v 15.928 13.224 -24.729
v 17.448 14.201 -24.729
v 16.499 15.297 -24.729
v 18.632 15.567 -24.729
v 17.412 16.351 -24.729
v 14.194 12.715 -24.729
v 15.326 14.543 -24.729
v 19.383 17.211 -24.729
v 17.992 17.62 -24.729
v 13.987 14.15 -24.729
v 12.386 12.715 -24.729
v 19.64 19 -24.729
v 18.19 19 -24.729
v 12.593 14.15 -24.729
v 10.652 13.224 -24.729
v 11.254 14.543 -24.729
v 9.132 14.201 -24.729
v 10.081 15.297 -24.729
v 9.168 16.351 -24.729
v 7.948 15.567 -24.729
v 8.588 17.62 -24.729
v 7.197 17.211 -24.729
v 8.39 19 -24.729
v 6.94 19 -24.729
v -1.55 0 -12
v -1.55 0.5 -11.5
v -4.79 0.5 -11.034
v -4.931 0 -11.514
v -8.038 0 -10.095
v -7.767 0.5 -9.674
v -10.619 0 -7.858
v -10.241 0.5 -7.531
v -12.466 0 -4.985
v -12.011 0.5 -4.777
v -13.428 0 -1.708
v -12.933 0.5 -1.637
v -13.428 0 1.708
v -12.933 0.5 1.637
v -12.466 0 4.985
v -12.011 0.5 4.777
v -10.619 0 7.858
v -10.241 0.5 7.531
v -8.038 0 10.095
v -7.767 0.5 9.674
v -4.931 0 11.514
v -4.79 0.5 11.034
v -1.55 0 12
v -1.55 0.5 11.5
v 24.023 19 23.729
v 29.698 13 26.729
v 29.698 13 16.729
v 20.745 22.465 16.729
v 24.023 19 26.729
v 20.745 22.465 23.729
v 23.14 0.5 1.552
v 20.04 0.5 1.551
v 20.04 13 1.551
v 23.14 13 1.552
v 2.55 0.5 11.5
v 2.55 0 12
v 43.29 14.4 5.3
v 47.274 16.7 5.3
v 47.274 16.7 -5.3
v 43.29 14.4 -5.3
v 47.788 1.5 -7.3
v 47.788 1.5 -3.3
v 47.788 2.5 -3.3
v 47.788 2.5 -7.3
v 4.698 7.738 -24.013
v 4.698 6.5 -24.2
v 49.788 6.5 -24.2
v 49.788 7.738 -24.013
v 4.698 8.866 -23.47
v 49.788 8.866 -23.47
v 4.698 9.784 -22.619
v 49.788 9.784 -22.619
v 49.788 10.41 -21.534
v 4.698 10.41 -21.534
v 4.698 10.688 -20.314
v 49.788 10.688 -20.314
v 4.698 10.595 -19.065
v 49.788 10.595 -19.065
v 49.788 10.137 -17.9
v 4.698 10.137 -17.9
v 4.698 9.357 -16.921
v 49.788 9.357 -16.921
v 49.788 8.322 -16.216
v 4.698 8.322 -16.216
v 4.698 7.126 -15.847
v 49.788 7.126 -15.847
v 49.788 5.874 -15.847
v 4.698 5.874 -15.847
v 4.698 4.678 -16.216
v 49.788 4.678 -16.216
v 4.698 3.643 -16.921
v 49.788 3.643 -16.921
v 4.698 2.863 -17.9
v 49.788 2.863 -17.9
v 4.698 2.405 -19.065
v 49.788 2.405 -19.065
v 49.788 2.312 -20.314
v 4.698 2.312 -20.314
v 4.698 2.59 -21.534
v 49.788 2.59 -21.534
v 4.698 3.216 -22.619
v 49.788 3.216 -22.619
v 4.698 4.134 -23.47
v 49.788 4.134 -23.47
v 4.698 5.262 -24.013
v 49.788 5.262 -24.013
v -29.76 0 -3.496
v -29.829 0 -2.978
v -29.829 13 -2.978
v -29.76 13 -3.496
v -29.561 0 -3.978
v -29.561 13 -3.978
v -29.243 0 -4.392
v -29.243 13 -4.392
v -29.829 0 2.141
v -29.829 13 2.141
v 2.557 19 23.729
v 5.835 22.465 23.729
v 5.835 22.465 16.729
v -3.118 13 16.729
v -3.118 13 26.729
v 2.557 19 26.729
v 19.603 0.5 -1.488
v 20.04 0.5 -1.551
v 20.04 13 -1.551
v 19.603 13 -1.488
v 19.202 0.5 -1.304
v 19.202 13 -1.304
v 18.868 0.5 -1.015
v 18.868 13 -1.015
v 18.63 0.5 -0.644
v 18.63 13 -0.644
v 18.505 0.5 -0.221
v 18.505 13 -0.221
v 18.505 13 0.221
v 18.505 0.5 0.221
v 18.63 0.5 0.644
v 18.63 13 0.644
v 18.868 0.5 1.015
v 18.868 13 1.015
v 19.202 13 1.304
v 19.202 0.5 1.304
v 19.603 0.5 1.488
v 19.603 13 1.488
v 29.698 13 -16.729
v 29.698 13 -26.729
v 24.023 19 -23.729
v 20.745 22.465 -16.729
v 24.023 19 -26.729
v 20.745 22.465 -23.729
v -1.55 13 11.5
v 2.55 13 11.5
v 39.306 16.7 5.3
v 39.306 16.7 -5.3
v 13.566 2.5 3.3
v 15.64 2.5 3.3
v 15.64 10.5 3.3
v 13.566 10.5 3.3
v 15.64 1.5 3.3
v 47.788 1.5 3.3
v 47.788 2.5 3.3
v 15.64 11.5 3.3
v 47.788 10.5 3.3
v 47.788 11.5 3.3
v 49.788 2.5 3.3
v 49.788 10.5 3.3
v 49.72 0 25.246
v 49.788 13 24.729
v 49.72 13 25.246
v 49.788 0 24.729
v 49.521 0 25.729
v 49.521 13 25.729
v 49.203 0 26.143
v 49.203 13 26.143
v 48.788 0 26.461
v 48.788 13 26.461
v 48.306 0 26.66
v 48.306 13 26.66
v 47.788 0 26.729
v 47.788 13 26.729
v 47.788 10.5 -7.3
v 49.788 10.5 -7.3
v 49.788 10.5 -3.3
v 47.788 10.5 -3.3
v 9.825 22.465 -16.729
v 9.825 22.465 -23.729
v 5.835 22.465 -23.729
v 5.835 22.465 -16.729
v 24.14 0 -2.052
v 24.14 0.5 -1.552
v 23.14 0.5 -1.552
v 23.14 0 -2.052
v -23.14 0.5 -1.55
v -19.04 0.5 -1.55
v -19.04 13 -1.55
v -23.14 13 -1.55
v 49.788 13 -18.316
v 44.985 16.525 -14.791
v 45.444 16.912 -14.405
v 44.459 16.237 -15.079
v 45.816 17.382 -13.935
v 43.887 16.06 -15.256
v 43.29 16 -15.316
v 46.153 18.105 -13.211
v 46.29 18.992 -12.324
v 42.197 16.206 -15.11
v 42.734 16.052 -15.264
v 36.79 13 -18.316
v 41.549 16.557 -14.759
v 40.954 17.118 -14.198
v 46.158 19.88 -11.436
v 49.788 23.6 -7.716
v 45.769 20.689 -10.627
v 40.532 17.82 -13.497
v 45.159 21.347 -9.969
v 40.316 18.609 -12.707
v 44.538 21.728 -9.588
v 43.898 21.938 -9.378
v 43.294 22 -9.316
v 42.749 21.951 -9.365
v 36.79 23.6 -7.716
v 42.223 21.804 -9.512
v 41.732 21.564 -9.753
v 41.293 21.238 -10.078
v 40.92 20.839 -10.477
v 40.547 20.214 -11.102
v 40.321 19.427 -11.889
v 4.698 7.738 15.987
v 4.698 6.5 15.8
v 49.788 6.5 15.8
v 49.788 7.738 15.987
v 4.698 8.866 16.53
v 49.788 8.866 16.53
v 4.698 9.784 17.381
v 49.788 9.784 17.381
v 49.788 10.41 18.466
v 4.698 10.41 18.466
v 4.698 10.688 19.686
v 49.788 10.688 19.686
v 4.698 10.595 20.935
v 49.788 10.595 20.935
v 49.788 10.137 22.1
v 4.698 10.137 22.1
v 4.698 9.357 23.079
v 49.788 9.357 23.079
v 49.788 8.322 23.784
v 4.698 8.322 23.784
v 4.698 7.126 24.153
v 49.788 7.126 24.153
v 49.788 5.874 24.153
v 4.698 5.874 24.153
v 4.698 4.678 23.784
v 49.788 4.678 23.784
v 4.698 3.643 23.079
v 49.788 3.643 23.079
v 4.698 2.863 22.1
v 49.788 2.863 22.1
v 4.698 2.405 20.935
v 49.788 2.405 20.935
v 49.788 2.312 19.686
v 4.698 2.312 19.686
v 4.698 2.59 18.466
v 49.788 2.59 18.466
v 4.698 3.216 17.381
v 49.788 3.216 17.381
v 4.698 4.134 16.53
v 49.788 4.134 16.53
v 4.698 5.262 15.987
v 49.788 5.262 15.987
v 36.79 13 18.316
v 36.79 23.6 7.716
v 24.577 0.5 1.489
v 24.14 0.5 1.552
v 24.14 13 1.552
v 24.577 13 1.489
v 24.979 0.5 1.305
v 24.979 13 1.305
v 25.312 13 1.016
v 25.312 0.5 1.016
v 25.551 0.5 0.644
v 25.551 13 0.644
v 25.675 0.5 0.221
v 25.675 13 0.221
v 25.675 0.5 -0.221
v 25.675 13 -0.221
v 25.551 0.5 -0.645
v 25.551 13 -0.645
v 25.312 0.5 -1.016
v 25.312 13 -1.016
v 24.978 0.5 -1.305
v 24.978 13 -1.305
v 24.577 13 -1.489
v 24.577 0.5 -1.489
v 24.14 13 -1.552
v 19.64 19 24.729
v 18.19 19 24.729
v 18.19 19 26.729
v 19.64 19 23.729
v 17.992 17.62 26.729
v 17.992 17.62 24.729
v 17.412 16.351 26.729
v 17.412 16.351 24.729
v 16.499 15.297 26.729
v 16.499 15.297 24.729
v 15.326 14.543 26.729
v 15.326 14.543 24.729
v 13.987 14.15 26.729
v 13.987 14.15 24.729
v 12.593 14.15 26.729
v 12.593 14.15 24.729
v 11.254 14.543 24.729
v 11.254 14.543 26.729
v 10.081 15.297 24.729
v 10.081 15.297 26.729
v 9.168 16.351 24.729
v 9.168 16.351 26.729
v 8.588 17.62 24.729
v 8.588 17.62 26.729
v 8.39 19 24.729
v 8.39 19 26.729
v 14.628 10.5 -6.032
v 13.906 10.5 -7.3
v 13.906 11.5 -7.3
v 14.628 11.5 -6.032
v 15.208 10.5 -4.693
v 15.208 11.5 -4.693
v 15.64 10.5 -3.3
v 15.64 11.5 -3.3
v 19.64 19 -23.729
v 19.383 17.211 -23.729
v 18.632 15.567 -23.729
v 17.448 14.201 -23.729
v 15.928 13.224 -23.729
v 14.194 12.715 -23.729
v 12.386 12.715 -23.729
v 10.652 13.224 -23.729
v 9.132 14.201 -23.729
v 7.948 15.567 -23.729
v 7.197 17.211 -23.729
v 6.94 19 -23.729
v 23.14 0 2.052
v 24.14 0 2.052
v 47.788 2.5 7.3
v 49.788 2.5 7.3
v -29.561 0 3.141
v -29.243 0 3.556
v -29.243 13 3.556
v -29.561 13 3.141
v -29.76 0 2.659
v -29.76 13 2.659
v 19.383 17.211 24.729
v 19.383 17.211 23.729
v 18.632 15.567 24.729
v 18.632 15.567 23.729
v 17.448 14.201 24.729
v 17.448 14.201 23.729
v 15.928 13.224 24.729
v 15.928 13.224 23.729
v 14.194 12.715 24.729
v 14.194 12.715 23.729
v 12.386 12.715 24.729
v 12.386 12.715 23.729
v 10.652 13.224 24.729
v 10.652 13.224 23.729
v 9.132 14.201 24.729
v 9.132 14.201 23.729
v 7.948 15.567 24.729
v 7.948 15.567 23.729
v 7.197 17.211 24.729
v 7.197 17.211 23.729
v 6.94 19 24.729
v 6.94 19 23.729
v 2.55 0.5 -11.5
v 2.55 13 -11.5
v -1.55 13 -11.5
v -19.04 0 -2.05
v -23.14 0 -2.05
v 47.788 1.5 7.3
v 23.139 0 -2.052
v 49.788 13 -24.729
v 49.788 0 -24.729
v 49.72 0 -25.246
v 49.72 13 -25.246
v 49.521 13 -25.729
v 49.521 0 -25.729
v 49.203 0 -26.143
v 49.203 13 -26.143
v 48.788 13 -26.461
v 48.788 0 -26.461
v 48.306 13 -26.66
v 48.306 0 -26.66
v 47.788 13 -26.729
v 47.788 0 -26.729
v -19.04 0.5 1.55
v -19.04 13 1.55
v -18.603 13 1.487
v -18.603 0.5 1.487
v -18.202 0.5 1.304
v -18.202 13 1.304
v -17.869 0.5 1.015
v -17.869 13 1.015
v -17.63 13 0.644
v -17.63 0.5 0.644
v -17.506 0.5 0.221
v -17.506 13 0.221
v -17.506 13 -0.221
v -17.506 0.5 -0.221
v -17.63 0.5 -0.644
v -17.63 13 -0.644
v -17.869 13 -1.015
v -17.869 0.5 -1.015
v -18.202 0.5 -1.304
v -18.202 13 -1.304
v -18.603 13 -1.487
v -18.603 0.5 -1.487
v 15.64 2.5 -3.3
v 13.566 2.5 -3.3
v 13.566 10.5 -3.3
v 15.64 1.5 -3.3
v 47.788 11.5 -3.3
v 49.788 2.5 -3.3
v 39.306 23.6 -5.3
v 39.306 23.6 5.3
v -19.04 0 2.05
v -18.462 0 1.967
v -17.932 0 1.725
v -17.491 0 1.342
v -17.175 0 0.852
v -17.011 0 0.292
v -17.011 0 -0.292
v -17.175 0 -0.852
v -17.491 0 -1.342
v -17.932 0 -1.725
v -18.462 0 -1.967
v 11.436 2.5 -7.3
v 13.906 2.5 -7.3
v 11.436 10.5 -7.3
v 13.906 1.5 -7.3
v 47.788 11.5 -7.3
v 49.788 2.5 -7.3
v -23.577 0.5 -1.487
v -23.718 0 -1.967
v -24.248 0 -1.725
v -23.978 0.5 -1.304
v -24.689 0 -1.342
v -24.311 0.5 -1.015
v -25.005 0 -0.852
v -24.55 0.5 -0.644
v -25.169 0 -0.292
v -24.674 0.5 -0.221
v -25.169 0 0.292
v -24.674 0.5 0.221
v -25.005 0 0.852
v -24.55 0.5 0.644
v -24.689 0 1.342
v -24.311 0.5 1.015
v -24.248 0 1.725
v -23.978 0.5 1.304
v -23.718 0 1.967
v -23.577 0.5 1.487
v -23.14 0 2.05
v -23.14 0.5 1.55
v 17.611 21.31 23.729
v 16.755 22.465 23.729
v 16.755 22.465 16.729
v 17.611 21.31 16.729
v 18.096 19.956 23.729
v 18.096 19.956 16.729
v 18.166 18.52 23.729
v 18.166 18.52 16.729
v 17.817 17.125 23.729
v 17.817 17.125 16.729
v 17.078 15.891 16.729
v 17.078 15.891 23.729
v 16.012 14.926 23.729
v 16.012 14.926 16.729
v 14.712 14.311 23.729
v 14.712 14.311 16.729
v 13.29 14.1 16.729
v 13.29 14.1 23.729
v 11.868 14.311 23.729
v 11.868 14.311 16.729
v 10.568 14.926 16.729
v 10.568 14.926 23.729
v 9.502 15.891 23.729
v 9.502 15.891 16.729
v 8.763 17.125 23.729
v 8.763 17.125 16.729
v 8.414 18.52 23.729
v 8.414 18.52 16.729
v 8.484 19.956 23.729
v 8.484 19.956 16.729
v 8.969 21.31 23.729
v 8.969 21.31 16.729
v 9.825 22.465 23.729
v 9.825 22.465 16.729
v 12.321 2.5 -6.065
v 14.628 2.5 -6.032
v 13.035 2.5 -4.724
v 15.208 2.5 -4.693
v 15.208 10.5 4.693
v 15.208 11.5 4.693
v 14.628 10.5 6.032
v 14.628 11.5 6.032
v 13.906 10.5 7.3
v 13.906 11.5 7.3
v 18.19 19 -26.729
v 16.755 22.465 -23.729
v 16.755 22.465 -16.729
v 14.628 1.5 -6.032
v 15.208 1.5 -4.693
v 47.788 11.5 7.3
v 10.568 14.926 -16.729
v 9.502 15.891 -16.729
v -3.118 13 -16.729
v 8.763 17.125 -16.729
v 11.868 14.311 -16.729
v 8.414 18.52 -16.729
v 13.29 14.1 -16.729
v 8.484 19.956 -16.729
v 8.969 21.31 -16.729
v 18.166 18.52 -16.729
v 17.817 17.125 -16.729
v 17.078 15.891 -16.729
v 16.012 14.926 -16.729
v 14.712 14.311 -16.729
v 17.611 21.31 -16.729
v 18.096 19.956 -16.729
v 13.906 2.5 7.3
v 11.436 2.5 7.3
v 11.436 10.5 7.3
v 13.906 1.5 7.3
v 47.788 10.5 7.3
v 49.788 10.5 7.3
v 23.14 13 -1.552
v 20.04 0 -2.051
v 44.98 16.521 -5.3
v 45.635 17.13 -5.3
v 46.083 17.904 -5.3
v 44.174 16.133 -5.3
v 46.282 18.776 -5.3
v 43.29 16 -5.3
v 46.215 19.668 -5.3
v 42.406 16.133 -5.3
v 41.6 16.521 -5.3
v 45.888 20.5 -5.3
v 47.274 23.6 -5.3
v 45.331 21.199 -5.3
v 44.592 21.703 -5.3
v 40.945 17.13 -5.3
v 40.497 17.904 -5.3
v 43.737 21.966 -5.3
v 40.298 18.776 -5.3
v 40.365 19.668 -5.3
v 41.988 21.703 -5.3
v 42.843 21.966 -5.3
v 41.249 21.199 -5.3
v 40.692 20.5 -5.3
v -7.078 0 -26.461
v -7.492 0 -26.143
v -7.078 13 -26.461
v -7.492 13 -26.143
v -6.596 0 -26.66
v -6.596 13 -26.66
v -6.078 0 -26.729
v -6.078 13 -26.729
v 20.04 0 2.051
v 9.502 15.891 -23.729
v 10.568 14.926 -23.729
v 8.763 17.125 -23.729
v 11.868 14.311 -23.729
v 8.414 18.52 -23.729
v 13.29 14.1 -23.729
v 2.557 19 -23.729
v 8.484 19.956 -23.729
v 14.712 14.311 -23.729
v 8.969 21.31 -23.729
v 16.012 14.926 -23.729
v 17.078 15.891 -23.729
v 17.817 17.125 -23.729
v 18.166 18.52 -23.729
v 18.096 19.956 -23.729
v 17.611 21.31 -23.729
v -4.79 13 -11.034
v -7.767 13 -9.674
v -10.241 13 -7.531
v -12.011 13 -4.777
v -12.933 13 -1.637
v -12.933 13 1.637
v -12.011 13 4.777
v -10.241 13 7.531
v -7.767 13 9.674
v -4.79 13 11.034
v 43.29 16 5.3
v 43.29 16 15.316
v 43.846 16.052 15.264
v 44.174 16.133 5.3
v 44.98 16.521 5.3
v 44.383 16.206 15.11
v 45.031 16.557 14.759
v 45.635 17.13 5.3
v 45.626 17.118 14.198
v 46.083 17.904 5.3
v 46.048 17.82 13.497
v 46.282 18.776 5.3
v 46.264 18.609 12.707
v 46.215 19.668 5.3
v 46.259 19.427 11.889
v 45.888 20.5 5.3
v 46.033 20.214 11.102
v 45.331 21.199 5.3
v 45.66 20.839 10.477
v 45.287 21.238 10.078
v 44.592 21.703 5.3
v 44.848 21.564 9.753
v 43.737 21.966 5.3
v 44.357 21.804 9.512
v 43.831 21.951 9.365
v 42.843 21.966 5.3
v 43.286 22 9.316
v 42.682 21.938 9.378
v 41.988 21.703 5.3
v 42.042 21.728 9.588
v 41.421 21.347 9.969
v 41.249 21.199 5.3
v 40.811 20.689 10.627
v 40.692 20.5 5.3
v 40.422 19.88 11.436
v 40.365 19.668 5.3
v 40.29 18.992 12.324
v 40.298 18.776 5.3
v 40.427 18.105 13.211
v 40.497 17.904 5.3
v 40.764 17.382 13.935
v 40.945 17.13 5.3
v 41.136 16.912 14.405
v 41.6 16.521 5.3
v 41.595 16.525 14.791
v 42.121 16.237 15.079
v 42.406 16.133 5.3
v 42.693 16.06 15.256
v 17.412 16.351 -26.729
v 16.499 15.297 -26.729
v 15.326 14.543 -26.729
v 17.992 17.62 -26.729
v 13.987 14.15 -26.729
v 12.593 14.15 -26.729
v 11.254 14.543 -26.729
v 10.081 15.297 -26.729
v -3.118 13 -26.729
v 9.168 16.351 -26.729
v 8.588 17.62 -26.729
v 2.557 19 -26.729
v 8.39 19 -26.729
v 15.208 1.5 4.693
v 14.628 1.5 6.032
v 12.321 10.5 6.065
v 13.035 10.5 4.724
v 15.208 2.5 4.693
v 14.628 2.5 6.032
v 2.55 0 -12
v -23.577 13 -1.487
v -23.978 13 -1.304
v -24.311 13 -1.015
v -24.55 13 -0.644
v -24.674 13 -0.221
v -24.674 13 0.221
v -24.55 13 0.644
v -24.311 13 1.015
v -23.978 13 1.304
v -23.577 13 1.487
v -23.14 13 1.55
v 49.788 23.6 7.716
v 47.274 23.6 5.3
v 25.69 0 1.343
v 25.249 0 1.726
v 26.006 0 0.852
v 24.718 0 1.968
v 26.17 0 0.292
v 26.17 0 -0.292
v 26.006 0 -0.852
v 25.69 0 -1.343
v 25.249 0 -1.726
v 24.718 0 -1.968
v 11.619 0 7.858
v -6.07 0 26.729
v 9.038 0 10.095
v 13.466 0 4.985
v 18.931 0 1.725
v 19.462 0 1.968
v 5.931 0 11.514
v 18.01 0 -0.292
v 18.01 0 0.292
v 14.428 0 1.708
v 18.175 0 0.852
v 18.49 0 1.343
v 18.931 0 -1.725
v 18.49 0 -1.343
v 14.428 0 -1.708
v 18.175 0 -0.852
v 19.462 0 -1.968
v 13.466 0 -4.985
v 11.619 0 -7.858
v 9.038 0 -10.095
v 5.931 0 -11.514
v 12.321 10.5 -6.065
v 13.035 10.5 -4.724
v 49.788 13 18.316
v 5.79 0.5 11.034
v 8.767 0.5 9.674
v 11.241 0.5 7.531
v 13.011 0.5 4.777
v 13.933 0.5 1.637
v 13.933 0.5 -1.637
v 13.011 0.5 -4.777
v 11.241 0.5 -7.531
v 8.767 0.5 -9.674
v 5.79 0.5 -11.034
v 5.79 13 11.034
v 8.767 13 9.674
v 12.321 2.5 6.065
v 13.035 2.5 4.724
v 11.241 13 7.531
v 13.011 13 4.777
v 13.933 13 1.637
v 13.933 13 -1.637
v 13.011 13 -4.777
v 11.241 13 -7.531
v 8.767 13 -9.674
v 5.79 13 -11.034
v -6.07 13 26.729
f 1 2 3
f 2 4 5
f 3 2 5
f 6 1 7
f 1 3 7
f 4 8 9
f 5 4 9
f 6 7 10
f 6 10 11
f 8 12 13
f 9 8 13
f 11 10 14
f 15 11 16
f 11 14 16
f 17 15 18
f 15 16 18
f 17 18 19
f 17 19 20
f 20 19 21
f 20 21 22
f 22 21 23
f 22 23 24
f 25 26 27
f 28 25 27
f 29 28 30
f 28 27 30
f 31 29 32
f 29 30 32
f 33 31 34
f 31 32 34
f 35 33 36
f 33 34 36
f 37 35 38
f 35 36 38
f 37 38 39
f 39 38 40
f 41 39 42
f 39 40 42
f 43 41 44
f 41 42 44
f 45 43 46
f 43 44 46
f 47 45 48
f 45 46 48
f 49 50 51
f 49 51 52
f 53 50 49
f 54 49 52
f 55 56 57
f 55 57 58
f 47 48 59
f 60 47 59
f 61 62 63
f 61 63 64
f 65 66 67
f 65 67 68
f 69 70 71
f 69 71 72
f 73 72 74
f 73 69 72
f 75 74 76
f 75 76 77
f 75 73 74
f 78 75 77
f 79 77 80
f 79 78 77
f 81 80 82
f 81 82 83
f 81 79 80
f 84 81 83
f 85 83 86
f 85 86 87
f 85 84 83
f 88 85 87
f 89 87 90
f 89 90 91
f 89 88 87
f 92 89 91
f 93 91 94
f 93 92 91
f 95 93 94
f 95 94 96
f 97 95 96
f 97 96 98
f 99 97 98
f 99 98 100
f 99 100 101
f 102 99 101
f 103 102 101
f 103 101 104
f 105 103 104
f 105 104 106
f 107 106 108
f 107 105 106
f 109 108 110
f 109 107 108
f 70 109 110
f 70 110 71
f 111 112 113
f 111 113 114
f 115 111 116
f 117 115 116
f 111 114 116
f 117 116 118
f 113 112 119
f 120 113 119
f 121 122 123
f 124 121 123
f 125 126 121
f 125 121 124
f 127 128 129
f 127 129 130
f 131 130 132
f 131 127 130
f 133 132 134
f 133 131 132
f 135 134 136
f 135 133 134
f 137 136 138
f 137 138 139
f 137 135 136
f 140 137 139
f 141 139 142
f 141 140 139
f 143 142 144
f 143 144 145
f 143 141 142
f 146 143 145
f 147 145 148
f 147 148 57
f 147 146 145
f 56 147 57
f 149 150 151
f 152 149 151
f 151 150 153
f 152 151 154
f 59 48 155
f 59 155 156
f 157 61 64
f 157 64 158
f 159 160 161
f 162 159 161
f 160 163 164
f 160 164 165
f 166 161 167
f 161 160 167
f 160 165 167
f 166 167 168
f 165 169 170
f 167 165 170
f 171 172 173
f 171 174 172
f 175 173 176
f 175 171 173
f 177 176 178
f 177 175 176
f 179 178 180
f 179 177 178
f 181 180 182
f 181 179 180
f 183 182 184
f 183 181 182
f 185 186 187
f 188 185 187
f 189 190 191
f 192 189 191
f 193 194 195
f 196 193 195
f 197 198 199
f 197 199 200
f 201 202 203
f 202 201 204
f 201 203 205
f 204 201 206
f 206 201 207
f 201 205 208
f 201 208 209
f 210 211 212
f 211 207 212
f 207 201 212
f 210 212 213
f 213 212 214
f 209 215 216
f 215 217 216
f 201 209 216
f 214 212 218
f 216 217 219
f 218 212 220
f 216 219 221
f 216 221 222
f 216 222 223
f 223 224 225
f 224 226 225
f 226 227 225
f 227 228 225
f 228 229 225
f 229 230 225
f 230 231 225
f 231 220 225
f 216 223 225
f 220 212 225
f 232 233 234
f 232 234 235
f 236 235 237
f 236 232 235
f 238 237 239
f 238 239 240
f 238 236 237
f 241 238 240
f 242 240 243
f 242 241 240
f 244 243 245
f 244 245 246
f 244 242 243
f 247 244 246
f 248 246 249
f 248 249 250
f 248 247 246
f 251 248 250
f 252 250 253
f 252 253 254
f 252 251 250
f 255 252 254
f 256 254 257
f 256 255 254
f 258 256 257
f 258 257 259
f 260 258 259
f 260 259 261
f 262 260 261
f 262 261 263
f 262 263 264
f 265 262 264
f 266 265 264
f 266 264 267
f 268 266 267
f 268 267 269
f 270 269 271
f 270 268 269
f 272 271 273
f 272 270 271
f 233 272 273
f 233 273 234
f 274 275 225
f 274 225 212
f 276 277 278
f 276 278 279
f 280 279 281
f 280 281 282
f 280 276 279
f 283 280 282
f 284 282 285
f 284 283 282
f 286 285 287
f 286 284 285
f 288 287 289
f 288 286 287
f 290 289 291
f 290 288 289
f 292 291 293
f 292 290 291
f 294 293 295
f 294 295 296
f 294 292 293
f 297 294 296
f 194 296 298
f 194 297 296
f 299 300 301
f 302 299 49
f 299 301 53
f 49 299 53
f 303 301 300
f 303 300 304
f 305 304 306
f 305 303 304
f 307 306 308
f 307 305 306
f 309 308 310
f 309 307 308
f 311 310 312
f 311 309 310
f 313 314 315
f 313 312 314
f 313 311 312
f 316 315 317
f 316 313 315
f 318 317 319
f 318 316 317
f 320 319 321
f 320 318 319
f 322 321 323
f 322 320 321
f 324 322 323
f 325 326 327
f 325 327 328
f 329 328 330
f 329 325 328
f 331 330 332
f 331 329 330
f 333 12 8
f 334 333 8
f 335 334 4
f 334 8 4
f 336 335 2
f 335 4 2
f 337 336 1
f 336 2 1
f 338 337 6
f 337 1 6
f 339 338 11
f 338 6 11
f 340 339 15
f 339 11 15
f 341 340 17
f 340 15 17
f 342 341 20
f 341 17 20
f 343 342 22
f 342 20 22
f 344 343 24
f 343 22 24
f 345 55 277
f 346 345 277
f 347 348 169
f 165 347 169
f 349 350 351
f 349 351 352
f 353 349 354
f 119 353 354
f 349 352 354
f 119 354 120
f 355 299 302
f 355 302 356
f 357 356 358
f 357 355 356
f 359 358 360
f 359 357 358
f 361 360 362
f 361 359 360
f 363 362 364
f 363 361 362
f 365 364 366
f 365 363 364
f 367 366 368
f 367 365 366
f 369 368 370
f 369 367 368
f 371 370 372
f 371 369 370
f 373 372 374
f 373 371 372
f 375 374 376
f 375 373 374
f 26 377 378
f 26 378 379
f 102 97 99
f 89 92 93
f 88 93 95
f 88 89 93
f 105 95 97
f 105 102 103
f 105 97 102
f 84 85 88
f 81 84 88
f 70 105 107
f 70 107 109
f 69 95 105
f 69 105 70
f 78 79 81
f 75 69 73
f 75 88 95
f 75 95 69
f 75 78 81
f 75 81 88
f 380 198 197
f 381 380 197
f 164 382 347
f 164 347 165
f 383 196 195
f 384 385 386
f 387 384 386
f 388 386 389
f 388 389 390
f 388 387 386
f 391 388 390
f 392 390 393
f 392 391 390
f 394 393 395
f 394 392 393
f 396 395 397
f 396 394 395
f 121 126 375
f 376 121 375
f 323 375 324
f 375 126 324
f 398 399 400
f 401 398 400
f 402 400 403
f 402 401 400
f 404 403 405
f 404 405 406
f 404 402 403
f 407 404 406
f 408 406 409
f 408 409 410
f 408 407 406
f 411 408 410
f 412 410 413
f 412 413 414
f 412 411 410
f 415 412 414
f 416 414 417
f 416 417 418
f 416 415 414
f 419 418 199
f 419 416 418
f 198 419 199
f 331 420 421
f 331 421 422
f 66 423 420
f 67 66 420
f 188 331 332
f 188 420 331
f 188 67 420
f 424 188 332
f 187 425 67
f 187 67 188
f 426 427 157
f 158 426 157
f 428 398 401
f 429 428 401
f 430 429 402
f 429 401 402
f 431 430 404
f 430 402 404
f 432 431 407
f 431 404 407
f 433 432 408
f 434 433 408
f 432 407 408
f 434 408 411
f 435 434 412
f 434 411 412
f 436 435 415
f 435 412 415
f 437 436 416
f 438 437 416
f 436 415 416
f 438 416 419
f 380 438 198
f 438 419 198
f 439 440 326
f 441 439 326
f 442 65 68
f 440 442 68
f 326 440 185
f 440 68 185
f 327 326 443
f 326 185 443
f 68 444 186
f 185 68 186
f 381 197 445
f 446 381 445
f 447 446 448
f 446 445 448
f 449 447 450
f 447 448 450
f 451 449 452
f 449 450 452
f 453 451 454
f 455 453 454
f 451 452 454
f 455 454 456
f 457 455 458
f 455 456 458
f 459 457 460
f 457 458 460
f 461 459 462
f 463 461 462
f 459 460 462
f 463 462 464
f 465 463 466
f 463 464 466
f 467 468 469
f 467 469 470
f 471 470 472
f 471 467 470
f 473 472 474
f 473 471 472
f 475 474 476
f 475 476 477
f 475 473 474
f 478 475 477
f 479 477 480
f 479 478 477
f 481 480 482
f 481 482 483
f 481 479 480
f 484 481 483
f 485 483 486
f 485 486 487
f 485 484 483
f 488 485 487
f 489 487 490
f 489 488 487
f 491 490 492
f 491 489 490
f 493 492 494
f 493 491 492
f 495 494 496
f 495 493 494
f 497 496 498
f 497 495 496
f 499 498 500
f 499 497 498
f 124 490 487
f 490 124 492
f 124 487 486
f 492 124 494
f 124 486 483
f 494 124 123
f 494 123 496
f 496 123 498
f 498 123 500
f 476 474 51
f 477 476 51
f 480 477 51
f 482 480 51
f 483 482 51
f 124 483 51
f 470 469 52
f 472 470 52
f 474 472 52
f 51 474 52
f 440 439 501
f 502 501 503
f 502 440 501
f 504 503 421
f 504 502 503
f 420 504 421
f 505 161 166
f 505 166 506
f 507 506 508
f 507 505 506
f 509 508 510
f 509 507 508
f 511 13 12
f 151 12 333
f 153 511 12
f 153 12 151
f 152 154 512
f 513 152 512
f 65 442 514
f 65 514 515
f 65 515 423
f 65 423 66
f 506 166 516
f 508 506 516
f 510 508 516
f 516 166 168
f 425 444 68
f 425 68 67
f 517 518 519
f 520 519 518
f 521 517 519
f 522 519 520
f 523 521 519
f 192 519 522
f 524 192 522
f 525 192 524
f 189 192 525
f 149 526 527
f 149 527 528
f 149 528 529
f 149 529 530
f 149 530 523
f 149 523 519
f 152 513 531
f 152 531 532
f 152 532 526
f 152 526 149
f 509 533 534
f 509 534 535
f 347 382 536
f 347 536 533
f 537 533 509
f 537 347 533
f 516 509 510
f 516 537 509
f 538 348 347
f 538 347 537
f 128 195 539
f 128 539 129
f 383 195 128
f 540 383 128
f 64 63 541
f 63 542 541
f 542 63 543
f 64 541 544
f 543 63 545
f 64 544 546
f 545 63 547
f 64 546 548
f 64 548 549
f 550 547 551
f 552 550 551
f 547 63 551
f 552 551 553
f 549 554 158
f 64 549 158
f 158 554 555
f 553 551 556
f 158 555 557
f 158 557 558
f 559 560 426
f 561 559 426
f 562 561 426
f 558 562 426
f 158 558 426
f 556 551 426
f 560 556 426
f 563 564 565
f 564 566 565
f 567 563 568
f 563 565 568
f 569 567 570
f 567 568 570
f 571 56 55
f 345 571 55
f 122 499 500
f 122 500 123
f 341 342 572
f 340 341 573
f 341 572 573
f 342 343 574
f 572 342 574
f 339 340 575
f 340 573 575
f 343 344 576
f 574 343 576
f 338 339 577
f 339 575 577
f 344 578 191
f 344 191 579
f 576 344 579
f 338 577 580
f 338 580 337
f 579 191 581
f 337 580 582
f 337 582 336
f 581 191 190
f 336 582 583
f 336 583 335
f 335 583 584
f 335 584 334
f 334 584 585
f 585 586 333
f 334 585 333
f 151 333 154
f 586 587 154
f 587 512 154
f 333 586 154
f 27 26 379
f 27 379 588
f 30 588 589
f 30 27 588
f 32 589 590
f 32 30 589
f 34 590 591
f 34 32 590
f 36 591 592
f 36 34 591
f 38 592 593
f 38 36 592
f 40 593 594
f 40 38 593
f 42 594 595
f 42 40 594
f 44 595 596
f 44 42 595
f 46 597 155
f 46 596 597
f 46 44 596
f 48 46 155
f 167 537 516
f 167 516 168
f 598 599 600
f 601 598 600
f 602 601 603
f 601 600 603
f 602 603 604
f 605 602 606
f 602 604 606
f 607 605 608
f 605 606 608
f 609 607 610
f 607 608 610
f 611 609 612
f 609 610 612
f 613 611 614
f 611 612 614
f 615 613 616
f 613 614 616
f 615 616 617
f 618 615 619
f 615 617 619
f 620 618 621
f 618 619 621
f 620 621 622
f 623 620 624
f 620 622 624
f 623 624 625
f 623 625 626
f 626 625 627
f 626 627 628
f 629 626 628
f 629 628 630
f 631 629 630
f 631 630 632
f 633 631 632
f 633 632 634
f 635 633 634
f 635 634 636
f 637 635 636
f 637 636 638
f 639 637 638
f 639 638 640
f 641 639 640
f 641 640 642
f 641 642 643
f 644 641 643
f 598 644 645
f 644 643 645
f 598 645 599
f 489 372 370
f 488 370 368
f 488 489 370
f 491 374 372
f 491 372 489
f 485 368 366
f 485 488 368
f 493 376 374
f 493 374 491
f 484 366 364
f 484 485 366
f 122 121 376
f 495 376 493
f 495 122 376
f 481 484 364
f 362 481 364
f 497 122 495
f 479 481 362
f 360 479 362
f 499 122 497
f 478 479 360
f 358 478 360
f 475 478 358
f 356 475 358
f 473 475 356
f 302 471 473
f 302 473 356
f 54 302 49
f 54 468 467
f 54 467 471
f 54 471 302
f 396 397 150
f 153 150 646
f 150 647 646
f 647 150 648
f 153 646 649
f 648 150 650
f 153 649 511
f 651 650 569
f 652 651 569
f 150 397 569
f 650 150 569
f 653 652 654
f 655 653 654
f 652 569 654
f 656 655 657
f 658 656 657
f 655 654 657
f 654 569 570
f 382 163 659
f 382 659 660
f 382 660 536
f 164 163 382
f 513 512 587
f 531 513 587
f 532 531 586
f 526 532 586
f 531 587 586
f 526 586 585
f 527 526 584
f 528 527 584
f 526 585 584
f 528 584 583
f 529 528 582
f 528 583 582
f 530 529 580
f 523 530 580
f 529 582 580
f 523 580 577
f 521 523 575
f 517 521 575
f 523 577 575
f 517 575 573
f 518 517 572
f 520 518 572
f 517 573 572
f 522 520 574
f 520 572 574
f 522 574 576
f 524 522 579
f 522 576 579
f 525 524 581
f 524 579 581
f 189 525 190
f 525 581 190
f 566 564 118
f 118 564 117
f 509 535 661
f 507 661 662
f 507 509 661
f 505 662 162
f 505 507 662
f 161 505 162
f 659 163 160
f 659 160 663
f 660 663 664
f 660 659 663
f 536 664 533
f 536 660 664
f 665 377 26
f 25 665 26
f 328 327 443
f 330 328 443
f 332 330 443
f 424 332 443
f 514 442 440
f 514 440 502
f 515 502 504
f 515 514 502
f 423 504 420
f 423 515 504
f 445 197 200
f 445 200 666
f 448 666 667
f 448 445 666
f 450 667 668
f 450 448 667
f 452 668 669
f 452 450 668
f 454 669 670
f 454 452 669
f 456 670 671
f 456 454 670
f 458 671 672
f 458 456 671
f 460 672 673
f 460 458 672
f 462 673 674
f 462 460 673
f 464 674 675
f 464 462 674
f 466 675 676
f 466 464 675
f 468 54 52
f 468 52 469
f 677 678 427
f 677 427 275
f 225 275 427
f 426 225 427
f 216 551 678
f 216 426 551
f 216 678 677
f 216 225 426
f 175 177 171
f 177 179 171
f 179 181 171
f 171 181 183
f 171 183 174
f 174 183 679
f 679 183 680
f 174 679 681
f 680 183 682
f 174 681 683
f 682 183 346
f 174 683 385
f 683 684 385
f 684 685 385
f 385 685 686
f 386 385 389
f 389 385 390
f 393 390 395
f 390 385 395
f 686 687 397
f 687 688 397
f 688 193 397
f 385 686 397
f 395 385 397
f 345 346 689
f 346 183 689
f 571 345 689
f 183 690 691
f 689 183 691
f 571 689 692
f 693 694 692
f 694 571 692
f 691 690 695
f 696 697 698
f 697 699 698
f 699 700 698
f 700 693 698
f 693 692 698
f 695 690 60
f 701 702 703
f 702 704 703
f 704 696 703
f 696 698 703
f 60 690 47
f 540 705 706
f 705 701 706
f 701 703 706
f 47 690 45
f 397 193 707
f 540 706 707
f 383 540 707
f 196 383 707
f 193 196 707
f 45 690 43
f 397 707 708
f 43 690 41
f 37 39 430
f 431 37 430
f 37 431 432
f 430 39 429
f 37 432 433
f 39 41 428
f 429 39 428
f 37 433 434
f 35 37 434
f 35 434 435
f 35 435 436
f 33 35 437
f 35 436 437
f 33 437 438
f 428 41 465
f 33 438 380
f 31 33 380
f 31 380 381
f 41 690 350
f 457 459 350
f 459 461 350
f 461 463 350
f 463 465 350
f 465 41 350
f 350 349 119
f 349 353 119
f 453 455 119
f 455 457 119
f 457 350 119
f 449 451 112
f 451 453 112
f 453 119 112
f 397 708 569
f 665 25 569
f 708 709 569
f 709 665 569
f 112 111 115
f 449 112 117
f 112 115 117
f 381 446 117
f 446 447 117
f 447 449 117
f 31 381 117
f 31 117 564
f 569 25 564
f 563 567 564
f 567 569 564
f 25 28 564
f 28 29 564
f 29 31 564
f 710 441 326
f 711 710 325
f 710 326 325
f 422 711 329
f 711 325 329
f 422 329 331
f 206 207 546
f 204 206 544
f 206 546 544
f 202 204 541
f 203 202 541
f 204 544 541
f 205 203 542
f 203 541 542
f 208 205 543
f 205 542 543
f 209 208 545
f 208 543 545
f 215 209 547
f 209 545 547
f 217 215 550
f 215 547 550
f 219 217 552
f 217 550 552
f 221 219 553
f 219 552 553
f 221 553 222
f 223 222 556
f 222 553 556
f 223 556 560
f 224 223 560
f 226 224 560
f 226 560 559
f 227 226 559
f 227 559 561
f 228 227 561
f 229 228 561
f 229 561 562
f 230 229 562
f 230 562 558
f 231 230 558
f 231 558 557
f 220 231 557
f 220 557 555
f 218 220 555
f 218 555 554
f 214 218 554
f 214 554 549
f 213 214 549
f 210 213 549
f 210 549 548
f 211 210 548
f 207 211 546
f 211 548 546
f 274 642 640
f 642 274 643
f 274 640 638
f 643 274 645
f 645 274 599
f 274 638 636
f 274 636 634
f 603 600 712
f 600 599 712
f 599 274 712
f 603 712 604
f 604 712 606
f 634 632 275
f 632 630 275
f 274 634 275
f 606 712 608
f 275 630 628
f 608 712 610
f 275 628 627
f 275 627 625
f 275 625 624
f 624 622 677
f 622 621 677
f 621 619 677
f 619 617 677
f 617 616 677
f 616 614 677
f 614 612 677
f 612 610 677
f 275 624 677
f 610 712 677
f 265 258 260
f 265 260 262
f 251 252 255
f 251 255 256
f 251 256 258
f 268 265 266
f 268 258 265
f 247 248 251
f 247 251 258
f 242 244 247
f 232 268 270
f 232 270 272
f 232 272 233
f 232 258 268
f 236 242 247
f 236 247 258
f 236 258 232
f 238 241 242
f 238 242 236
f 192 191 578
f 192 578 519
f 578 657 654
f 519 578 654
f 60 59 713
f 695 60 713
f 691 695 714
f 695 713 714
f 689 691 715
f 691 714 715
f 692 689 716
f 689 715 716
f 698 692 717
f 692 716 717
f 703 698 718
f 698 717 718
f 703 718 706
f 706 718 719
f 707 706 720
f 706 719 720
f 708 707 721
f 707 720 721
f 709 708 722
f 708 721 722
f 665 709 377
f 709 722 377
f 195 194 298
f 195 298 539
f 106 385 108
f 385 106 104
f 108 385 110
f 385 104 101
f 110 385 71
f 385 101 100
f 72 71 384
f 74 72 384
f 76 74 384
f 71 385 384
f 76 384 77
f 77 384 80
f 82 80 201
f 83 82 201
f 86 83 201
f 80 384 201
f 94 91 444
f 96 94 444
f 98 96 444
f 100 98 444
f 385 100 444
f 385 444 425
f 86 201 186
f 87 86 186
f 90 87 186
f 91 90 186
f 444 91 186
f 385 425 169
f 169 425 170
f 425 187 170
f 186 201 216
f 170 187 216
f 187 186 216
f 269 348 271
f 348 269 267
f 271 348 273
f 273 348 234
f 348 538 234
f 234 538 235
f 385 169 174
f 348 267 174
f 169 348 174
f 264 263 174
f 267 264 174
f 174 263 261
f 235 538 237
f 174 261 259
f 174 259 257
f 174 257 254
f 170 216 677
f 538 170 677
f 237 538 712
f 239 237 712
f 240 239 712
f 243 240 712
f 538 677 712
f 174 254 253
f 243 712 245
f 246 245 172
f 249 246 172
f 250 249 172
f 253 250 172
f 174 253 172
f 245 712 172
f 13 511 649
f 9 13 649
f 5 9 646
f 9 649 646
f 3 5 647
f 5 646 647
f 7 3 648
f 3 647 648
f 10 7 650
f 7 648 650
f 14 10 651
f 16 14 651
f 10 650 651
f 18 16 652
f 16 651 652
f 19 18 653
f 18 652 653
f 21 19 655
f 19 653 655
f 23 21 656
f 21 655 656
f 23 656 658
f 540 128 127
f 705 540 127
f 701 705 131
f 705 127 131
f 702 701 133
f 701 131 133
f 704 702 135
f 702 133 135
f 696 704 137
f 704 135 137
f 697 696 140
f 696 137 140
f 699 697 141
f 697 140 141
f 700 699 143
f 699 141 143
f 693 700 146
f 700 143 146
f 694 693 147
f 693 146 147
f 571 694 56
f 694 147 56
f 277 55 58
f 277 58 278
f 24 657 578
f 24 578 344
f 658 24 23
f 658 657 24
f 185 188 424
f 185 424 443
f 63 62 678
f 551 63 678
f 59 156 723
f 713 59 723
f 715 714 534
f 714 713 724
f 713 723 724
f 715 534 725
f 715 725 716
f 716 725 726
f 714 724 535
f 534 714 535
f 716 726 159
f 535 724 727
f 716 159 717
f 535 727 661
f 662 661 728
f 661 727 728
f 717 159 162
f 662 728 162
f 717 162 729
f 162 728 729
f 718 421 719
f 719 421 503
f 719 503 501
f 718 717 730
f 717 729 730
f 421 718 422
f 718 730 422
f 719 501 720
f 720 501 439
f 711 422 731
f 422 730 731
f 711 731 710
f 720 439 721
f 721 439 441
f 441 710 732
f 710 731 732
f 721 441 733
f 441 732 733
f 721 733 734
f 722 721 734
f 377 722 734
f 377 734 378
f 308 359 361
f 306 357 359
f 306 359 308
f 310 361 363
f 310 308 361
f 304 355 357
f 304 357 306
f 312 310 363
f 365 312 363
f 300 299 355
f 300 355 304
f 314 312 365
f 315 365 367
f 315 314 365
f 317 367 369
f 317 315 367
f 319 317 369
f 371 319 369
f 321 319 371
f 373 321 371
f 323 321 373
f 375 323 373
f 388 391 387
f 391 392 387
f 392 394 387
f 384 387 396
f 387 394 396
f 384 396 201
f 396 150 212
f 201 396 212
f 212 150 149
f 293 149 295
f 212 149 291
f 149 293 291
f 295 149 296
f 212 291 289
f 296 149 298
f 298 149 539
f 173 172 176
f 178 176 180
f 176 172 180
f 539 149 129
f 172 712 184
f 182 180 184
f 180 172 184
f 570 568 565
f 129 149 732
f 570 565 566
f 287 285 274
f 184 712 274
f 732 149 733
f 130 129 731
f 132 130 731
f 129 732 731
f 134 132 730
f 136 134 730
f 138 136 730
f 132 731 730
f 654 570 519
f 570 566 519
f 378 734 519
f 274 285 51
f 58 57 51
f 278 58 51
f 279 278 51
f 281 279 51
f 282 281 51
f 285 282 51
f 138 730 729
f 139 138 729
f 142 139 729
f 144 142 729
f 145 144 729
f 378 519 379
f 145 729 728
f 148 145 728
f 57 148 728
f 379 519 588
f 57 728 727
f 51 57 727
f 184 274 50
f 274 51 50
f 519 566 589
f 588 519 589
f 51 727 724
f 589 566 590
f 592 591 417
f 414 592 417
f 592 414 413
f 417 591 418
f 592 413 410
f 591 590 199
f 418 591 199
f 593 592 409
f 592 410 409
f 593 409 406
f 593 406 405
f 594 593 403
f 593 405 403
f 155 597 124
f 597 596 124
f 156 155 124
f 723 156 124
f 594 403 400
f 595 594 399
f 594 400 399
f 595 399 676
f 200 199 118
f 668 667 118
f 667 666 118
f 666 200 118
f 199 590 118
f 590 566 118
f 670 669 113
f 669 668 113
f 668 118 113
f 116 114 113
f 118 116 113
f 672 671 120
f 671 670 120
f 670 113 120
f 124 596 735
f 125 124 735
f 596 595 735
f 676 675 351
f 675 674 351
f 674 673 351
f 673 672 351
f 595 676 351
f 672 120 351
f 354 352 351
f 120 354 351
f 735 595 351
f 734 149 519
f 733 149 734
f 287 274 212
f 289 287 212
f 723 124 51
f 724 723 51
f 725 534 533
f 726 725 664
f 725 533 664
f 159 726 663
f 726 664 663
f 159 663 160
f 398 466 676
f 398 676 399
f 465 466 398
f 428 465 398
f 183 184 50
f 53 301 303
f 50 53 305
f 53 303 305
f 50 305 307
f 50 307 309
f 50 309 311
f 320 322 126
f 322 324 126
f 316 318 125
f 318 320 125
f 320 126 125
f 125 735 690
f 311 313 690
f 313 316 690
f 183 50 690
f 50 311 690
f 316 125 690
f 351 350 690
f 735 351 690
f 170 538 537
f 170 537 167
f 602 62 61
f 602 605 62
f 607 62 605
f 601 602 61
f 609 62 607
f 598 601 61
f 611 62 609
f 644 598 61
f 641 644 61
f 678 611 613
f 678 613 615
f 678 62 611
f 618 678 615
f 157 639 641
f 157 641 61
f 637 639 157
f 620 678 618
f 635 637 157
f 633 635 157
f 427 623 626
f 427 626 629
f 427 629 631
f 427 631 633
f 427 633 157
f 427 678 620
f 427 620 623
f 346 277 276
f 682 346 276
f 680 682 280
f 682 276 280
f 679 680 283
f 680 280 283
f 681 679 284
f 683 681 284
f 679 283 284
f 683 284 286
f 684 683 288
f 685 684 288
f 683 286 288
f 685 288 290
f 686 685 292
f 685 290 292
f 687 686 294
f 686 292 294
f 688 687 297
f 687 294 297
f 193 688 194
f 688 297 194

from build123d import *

# Parameters (mm, degrees)
BOSS_EXTRUDE2_DEPTH      = 13
CUT_EXTRUDE6_DEPTH       = 43.108996013
CUT_EXTRUDE7_DEPTH       = 43.108996013
CUT_EXTRUDE8_DEPTH       = 13
SKETCH7_R                = 4.2
CUT_EXTRUDE9_DEPTH       = 30
BOSS_EXTRUDE3_DEPTH      = 10
CUT_EXTRUDE10_DEPTH      = 1
SKETCH13_R               = 4.2
BOSS_EXTRUDE4_DEPTH      = 20.09
SKETCH17_W               = 13
SKETCH17_H               = 15.432451
BOSS_EXTRUDE5_DEPTH      = 10.6
CHAMFER1_SIZE            = 10.6
SKETCH12_R               = 3
CUT_EXTRUDE11_DEPTH      = 77.770333281
CUT_EXTRUDE12_START      = -6.148636
CUT_EXTRUDE12_DEPTH      = 5.3
FILLET2_R                = 2
SKETCH25_W               = 86.308607618
SKETCH25_H               = 69.103285455
CUT_EXTRUDE13_DEPTH      = 0.00151491
CUT_EXTRUDE14_DEPTH      = 58.985456967
CUT_EXTRUDE15_REACH      = 89.237
CUT_EXTRUDE15_END_RADIUS = 11.5
SKETCH27_W               = 4
SKETCH27_H               = 8
SKETCH28_W               = 26.149590075
SKETCH28_H               = 8.463351347
CUT_EXTRUDE16_DEPTH      = 3
FILLET9_R                = 2
SKETCH34_R               = 4.2
BOSS_EXTRUDE7_DEPTH      = 5
CUT_EXTRUDE22_START      = -13
CUT_EXTRUDE22_DEPTH      = 13
CUT_EXTRUDE23_DEPTH      = 58.985456967
CUT_EXTRUDE24_START      = -1
CUT_EXTRUDE24_DEPTH      = 10
CHAMFER2_SIZE            = 0.5


# Read off the part's stored shape, not the designer's step: Cut-Extrude22
with BuildPart() as part:
    # Sketch1 → Boss-Extrude2 (new body)
    with BuildSketch(Plane(origin=(0, 0, 0), x_dir=(1, 0, 0), z_dir=(0, 1, 0))):
        Polygon((-2.969848481, 26.728636329), (-6.906313813, 26.728636329), (-29.828636329, 3.806313813), (-29.828636329, -2.969848481), (-6.069848481, -26.728636329), (-2.969848481, -26.728636329), (2.969848481, -26.728636329), (29.69848481, -26.728636329), (29.69848481, 26.728636329), (2.969848481, 26.728636329), align=None)
    extrude(amount=BOSS_EXTRUDE2_DEPTH)

    # Sketch1<8> → Cut-Extrude6 (cut, through all)
    with BuildSketch(Plane(origin=(0, 0, 0), x_dir=(1, 0, 0), z_dir=(0, 1, 0))):
        with BuildLine():
            Line((-23.14, -1.55), (-20.04, -1.55))
            ThreePointArc((-20.04, -1.55), (-18.49, 0), (-20.04, 1.55))
            Line((-20.04, 1.55), (-23.14, 1.55))
            ThreePointArc((-23.14, 1.55), (-24.69, 0), (-23.14, -1.55))
        make_face()
    extrude(amount=CUT_EXTRUDE6_DEPTH, mode=Mode.SUBTRACT)

    # Sketch1<9> → Cut-Extrude7 (cut, through all)
    with BuildSketch(Plane(origin=(0, 0, 0), x_dir=(1, 0, 0), z_dir=(0, 1, 0))):
        with BuildLine():
            Line((9.28999972, -8.505433812), (9.28999972, 8.505433812))
            ThreePointArc((9.28999972, 8.505433812), (5.69954884, 10.725261974), (1.55, 11.5))
            Line((1.55, 11.5), (-1.55, 11.5))
            ThreePointArc((-1.55, 11.5), (-13.05, 0), (-1.55, -11.5))
            Line((-1.55, -11.5), (1.55, -11.5))
            ThreePointArc((1.55, -11.5), (5.69954884, -10.725261974), (9.28999972, -8.505433812))
        make_face()
        with BuildLine():
            ThreePointArc((9.28999972, -8.505433812), (13.05, 0), (9.28999972, 8.505433812))
            Line((9.28999972, 8.505433812), (9.28999972, -8.505433812))
        make_face()
    extrude(amount=CUT_EXTRUDE7_DEPTH, mode=Mode.SUBTRACT)

    # Sketch1<11> → Cut-Extrude8 (cut)
    with BuildSketch(Plane(origin=(0, 0, 0), x_dir=(1, 0, 0), z_dir=(0, 1, 0))):
        with BuildLine():
            Line((23.139619127, 1.551521906), (20.03999972, 1.550761))
            ThreePointArc((20.03999972, 1.550761), (18.48961936, 0), (20.03999972, -1.550761))
            Line((20.03999972, -1.550761), (23.14, -1.551521999))
            ThreePointArc((23.14, -1.551521999), (24.691521964, 0.000190413), (23.139619127, 1.551521906))
        make_face()
        with BuildLine():
            ThreePointArc((21.589619103, -0.059493857), (21.588478024, -1.2e-08), (21.589619104, 0.059493833))
            ThreePointArc((21.589619104, 0.059493833), (21.590760744, -1.2e-08), (21.589619103, -0.059493857))
        make_face(mode=Mode.SUBTRACT)
    extrude(amount=CUT_EXTRUDE8_DEPTH, mode=Mode.SUBTRACT)


with BuildPart() as cut_extrude8_piece_1:
    # of the separate pieces the step leaves, piece 1, a body of its own (cut_extrude8_pieces)
    add(part.part.solids().sort_by_distance((-6.906313813, 0, -26.728636329))[0])

    # Sketch7 → Cut-Extrude9 (cut)
    with BuildSketch(Plane(origin=(29.69848481, 0, 0), x_dir=(0, 0, -1), z_dir=(1, 0, 0))):
        with Locations((-20, 6.5)):
            Circle(SKETCH7_R)
        with Locations((20, 6.5)):
            Circle(SKETCH7_R)
    extrude(amount=-CUT_EXTRUDE9_DEPTH, mode=Mode.SUBTRACT)

    # Sketch9 → Boss-Extrude3 (add)
    with BuildSketch(Plane.XY.offset(26.728636329)):
        with BuildLine():
            Line((-3.11848537, 13), (29.69848481, 13))
            Line((29.69848481, 13), (20.745211893, 22.464823228))
            Line((20.745211893, 22.464823228), (16.754822948, 22.464823228))
            ThreePointArc((16.754822948, 22.464823228), (13.28999972, 14.1), (9.825176492, 22.464823228))
            Line((9.825176492, 22.464823228), (5.834787547, 22.464823228))
            Line((5.834787547, 22.464823228), (-3.11848537, 13))
        make_face()
    boss_extrude3 = extrude(amount=-BOSS_EXTRUDE3_DEPTH)

    # Sketch10 → Cut-Extrude10 (cut)
    with BuildSketch(Plane.XY.offset(24.728636329)):
        with BuildLine():
            Line((6.93999972, 19), (6.93999972, 29.430631577))
            Line((6.93999972, 29.430631577), (19.63999972, 29.430631577))
            Line((19.63999972, 29.430631577), (19.63999972, 19))
            ThreePointArc((19.63999972, 19), (13.28999972, 12.65), (6.93999972, 19))
        make_face()
    cut_extrude10 = extrude(amount=-CUT_EXTRUDE10_DEPTH, mode=Mode.SUBTRACT)

    # Mirror1: Boss-Extrude3, Cut-Extrude10 across plane
    add(boss_extrude3.mirror(Plane.XY))
    add(cut_extrude10.mirror(Plane.XY), mode=Mode.SUBTRACT)

    # Sketch13 → Boss-Extrude4 (add)
    with BuildSketch(Plane(origin=(29.69848481, 0, 0), x_dir=(0, 0, -1), z_dir=(1, 0, 0))):
        Polygon((-26.728636329, 0), (26.728636329, 0), (26.728636329, 13), (16.728636329, 13), (-16.728636329, 13), (-26.728636329, 13), align=None)
        with Locations((-20, 6.5)):
            Circle(SKETCH13_R, mode=Mode.SUBTRACT)
        with Locations((20, 6.5)):
            Circle(SKETCH13_R, mode=Mode.SUBTRACT)
    extrude(amount=BOSS_EXTRUDE4_DEPTH)

    # Sketch17 → Boss-Extrude5 (add)
    with BuildSketch(Plane(origin=(0, 13, 0), x_dir=(1, 0, 0), z_dir=(0, 1, 0))):
        with Locations((43.28999972, 0)):
            Rectangle(SKETCH17_W, SKETCH17_H)
    extrude(amount=BOSS_EXTRUDE5_DEPTH)

    # Chamfer1
    # the kernel refuses this chamfer: 10.6 mm, written as the material it adds along each edge
    with BuildSketch(Plane(origin=(49.78848481, 13, 7.7162255), x_dir=(0, -0.027495876610586376, 0.9996219169112966), z_dir=(-1, 0, 0)), Plane(origin=(36.78999972, 13, -7.7162255), x_dir=(0, -0.02749587661058638, -0.9996219169112966), z_dir=(1, 0, 0))) as chamfer1_piece_1:
        Polygon((CHAMFER1_SIZE * 0.999621916911, CHAMFER1_SIZE * 0.0274958766106), (-CHAMFER1_SIZE * 0.0274958766106, CHAMFER1_SIZE * 0.999621916911), (0, 0), align=None)
    extrude(amount=12.99848509)

    # Sketch12 → Cut-Extrude11 (cut, through all)
    with BuildSketch(Plane.XY.offset(26.728636329)):
        with Locations(Location((43.28999972, 19, 0), (0, 0, 270))):
            Circle(SKETCH12_R)
    extrude(amount=-CUT_EXTRUDE11_DEPTH, mode=Mode.SUBTRACT)

    # Sketch24 → Cut-Extrude12 (cut)
    with BuildSketch(Plane.XY.offset(6.148636329).offset(CUT_EXTRUDE12_START)):
        Polygon((47.273716577, 23.6), (47.273716577, 21.3), (47.273716577, 16.7), (43.28999972, 14.4), (39.306282862, 16.7), (39.306282862, 21.3), (39.306282862, 23.6), align=None)
    cut_extrude12 = extrude(amount=-CUT_EXTRUDE12_DEPTH, mode=Mode.SUBTRACT)

    # Fillet2
    fillet2_edges = [cut_extrude8_piece_1.edges().sort_by_distance(p)[0] for p in [
        (49.78848481, 6.5, 26.728636329),
        (49.78848481, 6.5, -26.728636329),
    ]]
    fillet(fillet2_edges, radius=FILLET2_R)

    # Sketch25 → Cut-Extrude13 (cut)
    with BuildSketch(Plane(origin=(49.78999972, 0, 0), x_dir=(0, 0, -1), z_dir=(1, 0, 0))):
        with Locations((0, 8.901936044)):
            Rectangle(SKETCH25_W, SKETCH25_H)
    extrude(amount=-CUT_EXTRUDE13_DEPTH, mode=Mode.SUBTRACT)

    # Cut-Extrude15: up to this cylinder (the profile starts outside it)
    cut_extrude15_end = Plane(origin=(1.55, 6.5, 0), z_dir=(0, -1, 0)) * Cylinder(CUT_EXTRUDE15_END_RADIUS, 202.474, mode=Mode.PRIVATE)
    # Sketch27 → Cut-Extrude15 (cut, up to the surface)
    with BuildSketch(Plane(origin=(49.78848481, 0, 0), x_dir=(0, 0, -1), z_dir=(1, 0, 0)), mode=Mode.PRIVATE) as cut_extrude15_sk1:
        with Locations((-5.3, 6.5)):
            Rectangle(SKETCH27_W, SKETCH27_H)
    cut_extrude15_tool1 = extrude(cut_extrude15_sk1.sketch, amount=-CUT_EXTRUDE15_REACH, mode=Mode.PRIVATE) - cut_extrude15_end
    cut_extrude15 = cut_extrude15_tool1.solids().sort_by_distance((49.788485, 6.5, 5.3))[0]
    add(cut_extrude15, mode=Mode.SUBTRACT)

    # Mirror2: Cut-Extrude15 across plane
    add(cut_extrude15.mirror(Plane.XY), mode=Mode.SUBTRACT)

    # Mirror3: Cut-Extrude12 across plane
    add(cut_extrude12.mirror(Plane.XY), mode=Mode.SUBTRACT)

    # Sketch28 → Cut-Extrude16 (cut)
    with BuildSketch(Plane.XY.offset(26.728636329)):
        with Locations((11.690030011, 23.231675673)):
            Rectangle(SKETCH28_W, SKETCH28_H)
    cut_extrude16 = extrude(amount=-CUT_EXTRUDE16_DEPTH, mode=Mode.SUBTRACT)

    # Mirror4: Cut-Extrude16 across plane
    add(cut_extrude16.mirror(Plane.XY), mode=Mode.SUBTRACT)

    # Fillet9
    fillet9_edges = [cut_extrude8_piece_1.edges().sort_by_distance(p)[0] for p in [
        (-6.906313813, 6.5, -26.728636329),
        (-29.828636329, 6.5, -3.806313813),
        (-29.828636329, 6.5, 2.969848481),
    ]]
    fillet(fillet9_edges, radius=FILLET9_R)

    # Sketch34 → Boss-Extrude7 (add)
    with BuildSketch(Plane(origin=(-0.30151519, 0, 0), x_dir=(0, 0, -1), z_dir=(1, 0, 0))):
        with Locations((-20, 6.5)):
            Circle(SKETCH34_R)
        with Locations((20, 6.5)):
            Circle(SKETCH34_R)
    extrude(amount=BOSS_EXTRUDE7_DEPTH)

    # Cut-Extrude22 outline → Cut-Extrude22 (cut)
    with BuildSketch(Plane(origin=(0, 13, 0), x_dir=(1, 0, 0), z_dir=(0, 1, 0)).offset(CUT_EXTRUDE22_START)):
        with BuildLine():
            ThreePointArc((-20.04, 1.55), (-18.49, 0), (-20.04, -1.55))
            Line((-20.04, -1.55), (-19.04, -1.55))
            ThreePointArc((-19.04, -1.55), (-17.49, 0), (-19.04, 1.55))
            Line((-19.04, 1.55), (-20.04, 1.55))
        make_face()
        with BuildLine():
            Line((24.139625451, 1.551521906), (23.14, 1.551521953))
            ThreePointArc((23.14, 1.551521953), (24.691521976, -2.3e-08), (23.14, -1.551521999))
            Line((23.14, -1.551521999), (24.139751204, -1.551521977))
            ThreePointArc((24.139751204, -1.551521977), (25.691147394, 6.2838e-05), (24.139625451, 1.551521906))
        make_face()
    extrude(amount=CUT_EXTRUDE22_DEPTH, mode=Mode.SUBTRACT)

    # Sketch38 → Cut-Extrude23 (cut, through all)
    with BuildSketch(Plane(origin=(0, 13, 0), x_dir=(1, 0, 0), z_dir=(0, 1, 0))):
        with BuildLine():
            ThreePointArc((1.55, 11.5), (13.05, 0), (1.55, -11.5))
            Line((1.55, -11.5), (2.55, -11.5))
            ThreePointArc((2.55, -11.5), (14.05, 0), (2.55, 11.5))
            Line((2.55, 11.5), (1.55, 11.5))
        make_face()
    extrude(amount=-CUT_EXTRUDE23_DEPTH, mode=Mode.SUBTRACT)

    # Sketch39 → Cut-Extrude24 (cut)
    with BuildSketch(Plane(origin=(0, 2.5, 0), x_dir=(1, 0, 0), z_dir=(0, 1, 0)).offset(CUT_EXTRUDE24_START)):
        with BuildLine():
            Line((47.78848481, 7.3), (13.906055653, 7.3))
            ThreePointArc((13.906055653, 7.3), (14.935796911, 5.370478086), (15.640454538, 3.3))
            Line((15.640454538, 3.3), (47.78848481, 3.3))
            Line((47.78848481, 3.3), (47.78848481, 7.3))
        make_face()
        with BuildLine():
            Line((13.906055653, -7.3), (47.78848481, -7.3))
            Line((47.78848481, -7.3), (47.78848481, -3.3))
            Line((47.78848481, -3.3), (15.640454538, -3.3))
            ThreePointArc((15.640454538, -3.3), (14.935796911, -5.370478086), (13.906055653, -7.3))
        make_face()
    extrude(amount=CUT_EXTRUDE24_DEPTH, mode=Mode.SUBTRACT)

    # Chamfer2
    chamfer2_edges = [cut_extrude8_piece_1.edges().sort_by_distance(p)[0] for p in [
        (0.5, 0, 11.5),
        (-13.05, 0, 0),
        (-24.69, 0, 0),
        (-21.09, 0, -1.55),
        (21.58999986, 0, 1.551141499),
        (18.48961936, 0, 0),
        (-17.49, 0, 0),
        (23.139809563, 0, -1.551521941),
        (25.691147394, 0, -6.2838e-05),
        (23.639875602, 0, 1.551521988),
        (23.639812726, 0, -1.55152193),
        (14.05, 0, 0),
        (-21.09, 0, 1.55),
        (0.5, 0, -11.5),
        (21.589809423, 0, -1.551141453),
    ]]
    chamfer(chamfer2_edges, length=CHAMFER2_SIZE)


with BuildPart() as cut_extrude8_piece_2:
    # of the separate pieces the step leaves, piece 2, a body of its own (cut_extrude8_pieces)
    add(part.part.solids().sort_by_distance((21.589619104, 0, -0.059493833))[0])

    # Sketch26 → Cut-Extrude14 (cut, through all)
    with BuildSketch(Plane(origin=(0, 13, 0), x_dir=(1, 0, 0), z_dir=(0, 1, 0))):
        with BuildLine():
            ThreePointArc((21.589619104, 0.059493833), (21.588478024, -1.2e-08), (21.589619103, -0.059493857))
            ThreePointArc((21.589619103, -0.059493857), (21.590760744, -1.2e-08), (21.589619104, 0.059493833))
        make_face()
    extrude(amount=-CUT_EXTRUDE14_DEPTH, mode=Mode.SUBTRACT)


solid = cut_extrude8_piece_1.part
